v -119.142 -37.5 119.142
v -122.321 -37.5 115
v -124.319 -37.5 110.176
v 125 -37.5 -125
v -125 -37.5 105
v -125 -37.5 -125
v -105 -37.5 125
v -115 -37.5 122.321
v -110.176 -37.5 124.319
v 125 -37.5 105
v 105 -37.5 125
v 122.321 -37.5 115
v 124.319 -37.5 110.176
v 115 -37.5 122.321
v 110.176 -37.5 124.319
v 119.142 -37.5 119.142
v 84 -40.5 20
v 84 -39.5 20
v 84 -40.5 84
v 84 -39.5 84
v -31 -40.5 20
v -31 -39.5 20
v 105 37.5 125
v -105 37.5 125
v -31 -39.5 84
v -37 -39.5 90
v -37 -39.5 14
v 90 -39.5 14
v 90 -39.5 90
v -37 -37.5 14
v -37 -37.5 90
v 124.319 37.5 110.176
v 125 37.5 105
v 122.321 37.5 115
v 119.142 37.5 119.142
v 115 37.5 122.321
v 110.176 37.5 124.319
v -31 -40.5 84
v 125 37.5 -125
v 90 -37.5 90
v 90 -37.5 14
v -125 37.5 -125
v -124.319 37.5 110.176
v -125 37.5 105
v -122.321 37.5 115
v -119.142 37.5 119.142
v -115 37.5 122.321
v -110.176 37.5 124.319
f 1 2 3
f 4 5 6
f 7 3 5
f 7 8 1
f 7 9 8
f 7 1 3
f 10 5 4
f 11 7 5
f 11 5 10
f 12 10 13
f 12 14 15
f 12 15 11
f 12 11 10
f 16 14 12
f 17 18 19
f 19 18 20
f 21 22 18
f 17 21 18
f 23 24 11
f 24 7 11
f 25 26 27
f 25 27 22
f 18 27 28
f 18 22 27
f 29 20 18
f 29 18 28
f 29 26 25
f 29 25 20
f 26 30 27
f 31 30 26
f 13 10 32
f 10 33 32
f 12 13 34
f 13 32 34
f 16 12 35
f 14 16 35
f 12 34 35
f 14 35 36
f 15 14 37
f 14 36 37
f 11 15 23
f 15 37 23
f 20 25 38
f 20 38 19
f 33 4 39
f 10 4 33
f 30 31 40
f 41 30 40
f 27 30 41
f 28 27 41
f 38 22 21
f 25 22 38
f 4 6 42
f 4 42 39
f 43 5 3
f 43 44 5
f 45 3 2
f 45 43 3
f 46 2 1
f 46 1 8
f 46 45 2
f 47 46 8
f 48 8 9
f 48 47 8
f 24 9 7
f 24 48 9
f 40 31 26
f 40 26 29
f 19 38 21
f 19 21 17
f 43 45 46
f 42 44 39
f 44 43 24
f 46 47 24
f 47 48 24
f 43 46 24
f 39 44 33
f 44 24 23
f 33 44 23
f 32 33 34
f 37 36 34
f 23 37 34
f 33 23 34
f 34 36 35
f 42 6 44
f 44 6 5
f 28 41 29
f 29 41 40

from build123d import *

# Parameters (mm, degrees)
F0_W     = 250
F0_H     = 250
F1_DEPTH = 37.5
F2_R     = 20
F3_W     = 127
F3_H     = 76
F4_DEPTH = 2
F5_W     = 115
F5_H     = 64
F6_DEPTH = 1


with BuildPart() as f1:
    # F0 (on Front) → F1 (new body, symmetric)
    with BuildSketch(Plane.XZ):
        Rectangle(F0_W, F0_H)
    extrude(amount=F1_DEPTH, both=True)

    # F2
    f2_edges = [f1.edges().sort_by_distance(p)[0] for p in [
        (125, 0, 125),
        (-125, 0, 125),
    ]]
    fillet(f2_edges, radius=F2_R)


with BuildPart() as f4:
    # F3 (on face) → F4 (new body)
    with BuildSketch(Plane.XZ.offset(37.5)):
        with Locations((26.5, 52)):
            Rectangle(F3_W, F3_H)
    extrude(amount=F4_DEPTH)

    # F5 (on face) → F6 (join)
    with BuildSketch(Plane.XZ.offset(39.5)):
        with Locations((26.5, 52)):
            Rectangle(F5_W, F5_H)
    extrude(amount=F6_DEPTH)


solid = Compound([f1.part, f4.part])
